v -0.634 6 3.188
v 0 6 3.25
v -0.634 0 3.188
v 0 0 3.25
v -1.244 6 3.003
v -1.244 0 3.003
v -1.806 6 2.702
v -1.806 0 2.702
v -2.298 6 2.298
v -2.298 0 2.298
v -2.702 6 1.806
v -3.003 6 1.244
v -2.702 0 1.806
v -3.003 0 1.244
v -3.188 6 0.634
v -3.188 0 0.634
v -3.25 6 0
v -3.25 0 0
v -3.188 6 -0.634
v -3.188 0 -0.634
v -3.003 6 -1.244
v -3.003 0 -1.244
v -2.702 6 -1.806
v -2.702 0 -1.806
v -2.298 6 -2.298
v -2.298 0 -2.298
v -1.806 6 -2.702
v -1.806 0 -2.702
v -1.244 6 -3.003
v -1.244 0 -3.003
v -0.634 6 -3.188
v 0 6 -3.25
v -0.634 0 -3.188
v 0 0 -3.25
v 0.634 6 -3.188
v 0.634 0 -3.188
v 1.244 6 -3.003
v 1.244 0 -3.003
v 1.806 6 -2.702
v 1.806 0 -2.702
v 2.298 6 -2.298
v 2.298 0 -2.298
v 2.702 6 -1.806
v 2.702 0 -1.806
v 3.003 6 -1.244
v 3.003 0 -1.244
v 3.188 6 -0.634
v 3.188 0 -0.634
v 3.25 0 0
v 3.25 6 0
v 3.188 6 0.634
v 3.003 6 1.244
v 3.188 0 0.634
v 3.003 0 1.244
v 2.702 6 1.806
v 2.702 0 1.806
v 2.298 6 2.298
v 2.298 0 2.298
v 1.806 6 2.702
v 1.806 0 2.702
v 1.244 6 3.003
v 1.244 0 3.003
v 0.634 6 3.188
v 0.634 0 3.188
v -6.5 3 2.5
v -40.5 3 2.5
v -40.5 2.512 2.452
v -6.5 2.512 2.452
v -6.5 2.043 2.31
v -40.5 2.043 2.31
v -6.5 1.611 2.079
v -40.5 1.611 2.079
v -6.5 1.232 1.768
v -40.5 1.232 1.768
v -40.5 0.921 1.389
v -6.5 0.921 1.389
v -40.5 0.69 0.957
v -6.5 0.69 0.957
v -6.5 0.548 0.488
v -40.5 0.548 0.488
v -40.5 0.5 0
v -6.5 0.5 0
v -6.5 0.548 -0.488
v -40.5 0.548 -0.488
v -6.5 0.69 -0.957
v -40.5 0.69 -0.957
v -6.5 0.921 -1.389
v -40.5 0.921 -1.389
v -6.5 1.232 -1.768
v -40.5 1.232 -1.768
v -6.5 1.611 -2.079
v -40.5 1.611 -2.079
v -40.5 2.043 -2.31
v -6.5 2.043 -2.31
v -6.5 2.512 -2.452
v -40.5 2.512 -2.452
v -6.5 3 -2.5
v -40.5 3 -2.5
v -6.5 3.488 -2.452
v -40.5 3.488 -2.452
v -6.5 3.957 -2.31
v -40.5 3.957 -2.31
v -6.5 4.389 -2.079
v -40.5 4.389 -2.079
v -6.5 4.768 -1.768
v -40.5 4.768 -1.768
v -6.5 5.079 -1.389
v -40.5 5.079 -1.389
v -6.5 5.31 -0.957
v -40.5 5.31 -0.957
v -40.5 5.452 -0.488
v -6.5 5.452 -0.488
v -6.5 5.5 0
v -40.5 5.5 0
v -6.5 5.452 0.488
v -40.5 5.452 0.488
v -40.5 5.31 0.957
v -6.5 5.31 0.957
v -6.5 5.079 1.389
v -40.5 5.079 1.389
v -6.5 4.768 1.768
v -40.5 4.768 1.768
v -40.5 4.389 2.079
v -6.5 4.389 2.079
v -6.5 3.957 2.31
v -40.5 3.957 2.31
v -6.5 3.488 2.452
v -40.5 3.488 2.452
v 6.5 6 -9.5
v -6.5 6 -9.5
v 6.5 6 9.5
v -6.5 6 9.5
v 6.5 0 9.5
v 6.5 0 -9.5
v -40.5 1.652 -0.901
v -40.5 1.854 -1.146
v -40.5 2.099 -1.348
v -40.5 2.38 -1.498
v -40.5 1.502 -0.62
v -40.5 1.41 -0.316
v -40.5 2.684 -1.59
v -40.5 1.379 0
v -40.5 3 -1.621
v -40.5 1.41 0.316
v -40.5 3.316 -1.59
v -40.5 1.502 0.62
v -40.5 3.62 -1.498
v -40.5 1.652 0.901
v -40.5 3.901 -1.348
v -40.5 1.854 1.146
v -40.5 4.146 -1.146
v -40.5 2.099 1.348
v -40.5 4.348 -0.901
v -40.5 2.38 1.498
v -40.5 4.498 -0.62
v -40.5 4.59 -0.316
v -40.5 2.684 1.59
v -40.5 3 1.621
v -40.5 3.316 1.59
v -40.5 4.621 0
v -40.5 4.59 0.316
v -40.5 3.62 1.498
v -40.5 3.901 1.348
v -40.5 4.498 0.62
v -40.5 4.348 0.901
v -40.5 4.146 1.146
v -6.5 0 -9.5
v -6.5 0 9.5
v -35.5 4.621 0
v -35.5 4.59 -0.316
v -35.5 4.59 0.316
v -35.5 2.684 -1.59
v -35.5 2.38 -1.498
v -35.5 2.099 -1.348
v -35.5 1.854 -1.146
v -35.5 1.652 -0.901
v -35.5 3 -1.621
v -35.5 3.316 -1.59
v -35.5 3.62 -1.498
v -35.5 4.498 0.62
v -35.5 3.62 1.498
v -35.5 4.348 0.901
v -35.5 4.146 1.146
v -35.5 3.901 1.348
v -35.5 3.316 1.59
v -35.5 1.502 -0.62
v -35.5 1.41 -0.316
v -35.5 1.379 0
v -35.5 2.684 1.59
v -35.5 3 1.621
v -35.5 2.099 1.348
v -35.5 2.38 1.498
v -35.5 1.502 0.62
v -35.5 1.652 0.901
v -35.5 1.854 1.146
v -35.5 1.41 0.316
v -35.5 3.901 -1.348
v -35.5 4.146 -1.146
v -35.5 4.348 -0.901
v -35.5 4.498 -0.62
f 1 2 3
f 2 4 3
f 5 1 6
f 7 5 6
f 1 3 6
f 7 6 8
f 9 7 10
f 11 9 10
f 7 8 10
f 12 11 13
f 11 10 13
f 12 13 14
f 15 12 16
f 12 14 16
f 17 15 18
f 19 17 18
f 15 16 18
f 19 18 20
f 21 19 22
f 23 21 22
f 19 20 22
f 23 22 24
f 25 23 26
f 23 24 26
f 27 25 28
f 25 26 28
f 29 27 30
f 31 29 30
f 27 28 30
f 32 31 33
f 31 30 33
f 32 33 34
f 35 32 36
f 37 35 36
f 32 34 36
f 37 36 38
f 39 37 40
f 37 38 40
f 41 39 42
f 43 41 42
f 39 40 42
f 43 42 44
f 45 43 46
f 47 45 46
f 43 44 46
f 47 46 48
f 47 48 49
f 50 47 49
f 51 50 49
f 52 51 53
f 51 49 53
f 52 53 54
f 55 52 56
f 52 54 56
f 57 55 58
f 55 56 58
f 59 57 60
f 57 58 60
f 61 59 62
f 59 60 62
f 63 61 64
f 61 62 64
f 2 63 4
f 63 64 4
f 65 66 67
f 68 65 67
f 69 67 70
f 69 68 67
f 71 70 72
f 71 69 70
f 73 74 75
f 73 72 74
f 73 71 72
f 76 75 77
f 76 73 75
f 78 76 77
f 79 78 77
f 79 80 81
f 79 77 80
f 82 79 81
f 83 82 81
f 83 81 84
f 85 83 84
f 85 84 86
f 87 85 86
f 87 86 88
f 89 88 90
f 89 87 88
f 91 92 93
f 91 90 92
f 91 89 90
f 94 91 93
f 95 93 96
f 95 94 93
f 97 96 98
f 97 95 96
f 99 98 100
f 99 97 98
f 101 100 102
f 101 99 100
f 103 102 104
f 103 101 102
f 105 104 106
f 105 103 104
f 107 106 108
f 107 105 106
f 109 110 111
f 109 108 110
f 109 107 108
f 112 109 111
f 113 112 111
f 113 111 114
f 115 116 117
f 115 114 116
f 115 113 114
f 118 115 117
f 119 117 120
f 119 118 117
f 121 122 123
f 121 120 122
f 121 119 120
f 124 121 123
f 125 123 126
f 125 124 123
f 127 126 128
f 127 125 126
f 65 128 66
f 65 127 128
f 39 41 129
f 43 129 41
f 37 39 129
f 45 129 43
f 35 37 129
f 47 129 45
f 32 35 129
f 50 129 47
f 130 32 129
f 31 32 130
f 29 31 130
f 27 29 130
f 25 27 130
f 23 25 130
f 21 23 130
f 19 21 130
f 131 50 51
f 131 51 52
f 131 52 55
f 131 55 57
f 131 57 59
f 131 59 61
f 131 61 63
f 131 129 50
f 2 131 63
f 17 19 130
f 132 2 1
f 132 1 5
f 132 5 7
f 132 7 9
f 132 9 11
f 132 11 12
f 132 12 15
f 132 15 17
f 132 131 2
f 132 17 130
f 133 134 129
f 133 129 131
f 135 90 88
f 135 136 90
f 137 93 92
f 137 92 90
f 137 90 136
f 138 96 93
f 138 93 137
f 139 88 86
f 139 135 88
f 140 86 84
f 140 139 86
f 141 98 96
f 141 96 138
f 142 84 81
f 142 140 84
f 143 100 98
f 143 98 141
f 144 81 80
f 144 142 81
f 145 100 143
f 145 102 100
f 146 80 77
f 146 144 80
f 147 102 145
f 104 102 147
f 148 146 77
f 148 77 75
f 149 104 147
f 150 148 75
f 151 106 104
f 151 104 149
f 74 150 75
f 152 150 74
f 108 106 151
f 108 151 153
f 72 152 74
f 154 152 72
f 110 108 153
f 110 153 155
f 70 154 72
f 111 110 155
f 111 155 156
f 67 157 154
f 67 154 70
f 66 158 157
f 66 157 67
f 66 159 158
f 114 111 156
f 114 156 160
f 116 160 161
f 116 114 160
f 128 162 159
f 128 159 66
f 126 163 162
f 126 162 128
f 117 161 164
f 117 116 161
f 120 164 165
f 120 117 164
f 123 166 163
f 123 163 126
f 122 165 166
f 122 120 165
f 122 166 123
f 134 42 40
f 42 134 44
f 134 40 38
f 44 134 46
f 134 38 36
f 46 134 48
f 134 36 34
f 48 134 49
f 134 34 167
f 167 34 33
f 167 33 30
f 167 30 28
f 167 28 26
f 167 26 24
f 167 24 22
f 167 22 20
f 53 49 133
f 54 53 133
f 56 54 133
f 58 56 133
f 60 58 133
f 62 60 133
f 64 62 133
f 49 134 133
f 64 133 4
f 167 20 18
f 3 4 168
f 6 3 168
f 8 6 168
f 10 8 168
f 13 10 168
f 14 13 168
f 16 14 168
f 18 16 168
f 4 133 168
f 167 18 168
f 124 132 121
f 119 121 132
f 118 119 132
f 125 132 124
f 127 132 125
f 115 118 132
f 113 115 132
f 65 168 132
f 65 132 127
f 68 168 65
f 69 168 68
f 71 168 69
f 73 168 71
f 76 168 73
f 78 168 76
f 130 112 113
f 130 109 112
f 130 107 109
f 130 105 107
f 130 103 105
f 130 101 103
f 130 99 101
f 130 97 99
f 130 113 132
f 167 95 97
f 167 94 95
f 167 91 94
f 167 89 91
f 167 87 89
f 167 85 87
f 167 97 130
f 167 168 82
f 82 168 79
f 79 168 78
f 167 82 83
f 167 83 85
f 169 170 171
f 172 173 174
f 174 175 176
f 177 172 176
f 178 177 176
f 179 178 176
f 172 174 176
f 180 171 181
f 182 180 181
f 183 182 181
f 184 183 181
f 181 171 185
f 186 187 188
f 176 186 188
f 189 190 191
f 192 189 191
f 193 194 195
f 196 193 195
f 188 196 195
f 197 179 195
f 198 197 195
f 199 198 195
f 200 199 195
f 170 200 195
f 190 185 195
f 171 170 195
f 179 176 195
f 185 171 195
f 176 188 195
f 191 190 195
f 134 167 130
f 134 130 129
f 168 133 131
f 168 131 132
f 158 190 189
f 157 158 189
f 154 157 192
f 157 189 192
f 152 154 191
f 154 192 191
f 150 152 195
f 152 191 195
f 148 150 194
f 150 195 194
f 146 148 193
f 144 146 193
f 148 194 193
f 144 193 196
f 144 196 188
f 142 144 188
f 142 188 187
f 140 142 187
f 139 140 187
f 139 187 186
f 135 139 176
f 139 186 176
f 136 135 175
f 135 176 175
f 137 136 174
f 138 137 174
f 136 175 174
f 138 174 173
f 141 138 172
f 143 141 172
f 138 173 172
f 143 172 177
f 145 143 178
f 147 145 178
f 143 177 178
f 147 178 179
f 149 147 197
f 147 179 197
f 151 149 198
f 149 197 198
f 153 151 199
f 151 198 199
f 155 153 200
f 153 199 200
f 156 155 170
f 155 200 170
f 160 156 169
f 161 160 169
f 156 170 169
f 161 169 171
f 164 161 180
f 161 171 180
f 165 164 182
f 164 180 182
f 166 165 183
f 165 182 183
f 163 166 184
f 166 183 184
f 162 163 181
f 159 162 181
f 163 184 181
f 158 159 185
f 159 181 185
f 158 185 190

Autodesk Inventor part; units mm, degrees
ref_plane "YZ Plane" through (0, 0, 0) normal (1, 0, 0) x (0, 1, 0)
ref_plane "XZ Plane" through (0, 0, 0) normal (0, 1, 0) x (-1, 0, 0)
ref_plane "XY Plane" through (0, 0, 0) normal (0, 0, 1) x (1, 0, 0)
sketch "Skizze2" plane through (0, 0, 0) normal (0, 1, 0) x (-1, 0, 0)
  line L0 (-6.5, 9.5) -> (6.5, 9.5)
  line L1 (6.5, 9.5) -> (6.5, -9.5)
  line L2 (6.5, -9.5) -> (-6.5, -9.5)
  line L3 (-6.5, -9.5) -> (-6.5, 9.5)
  line L4 (-6.5, 9.5) -> (6.5, -9.5) construction
  line L5 (6.5, 9.5) -> (-6.5, -9.5) construction
  point P0 (0, 0)
  dimension "d1" = 19
  dimension "d2" = 13
extrude "Extrusion1" add sketch "Skizze2" along normal blind 6
sketch "Skizze3" plane through (0, 6, 0) normal (0, 1, 0) x (1, 0, 0)
  point P0 (0, 0)
  point P1 (0, 0)
hole "Bohrung1" at (0, 6, 0) direction (0, -1, 0) diameter 6.5 depth 6
sketch "Skizze4" plane through (-6.5, 0, -9.5) normal (-1, 0, 0) x (0, 0, 1)
  circle A0 centre (9.5, 3) radius 2.5
  line L0 (0, 0) -> (0, 6) projected
  line L1 (0, 0) -> (19, 0) projected
  point P0 (9.5, 0)
  point P1 (0, 3)
  point P2 (9.5, 0)
  dimension "d12" = 5
extrude "Extrusion2" add sketch "Skizze4" along normal blind 34
sketch "Skizze5" plane through (-40.5, 3, 0) normal (-1, 0, 0) x (0, 0, 1)
  circle A0 centre (0, 0) radius 2.5 projected
  point P0 (0, -3)
hole "Bohrung2" at (-40.5, 3, 0) direction (1, 0, 0) diameter 3.242 depth 5 thread size "M4x0.7" class "6H" standard "ISO Metric profile"
properties part number "pleuel_m4"
